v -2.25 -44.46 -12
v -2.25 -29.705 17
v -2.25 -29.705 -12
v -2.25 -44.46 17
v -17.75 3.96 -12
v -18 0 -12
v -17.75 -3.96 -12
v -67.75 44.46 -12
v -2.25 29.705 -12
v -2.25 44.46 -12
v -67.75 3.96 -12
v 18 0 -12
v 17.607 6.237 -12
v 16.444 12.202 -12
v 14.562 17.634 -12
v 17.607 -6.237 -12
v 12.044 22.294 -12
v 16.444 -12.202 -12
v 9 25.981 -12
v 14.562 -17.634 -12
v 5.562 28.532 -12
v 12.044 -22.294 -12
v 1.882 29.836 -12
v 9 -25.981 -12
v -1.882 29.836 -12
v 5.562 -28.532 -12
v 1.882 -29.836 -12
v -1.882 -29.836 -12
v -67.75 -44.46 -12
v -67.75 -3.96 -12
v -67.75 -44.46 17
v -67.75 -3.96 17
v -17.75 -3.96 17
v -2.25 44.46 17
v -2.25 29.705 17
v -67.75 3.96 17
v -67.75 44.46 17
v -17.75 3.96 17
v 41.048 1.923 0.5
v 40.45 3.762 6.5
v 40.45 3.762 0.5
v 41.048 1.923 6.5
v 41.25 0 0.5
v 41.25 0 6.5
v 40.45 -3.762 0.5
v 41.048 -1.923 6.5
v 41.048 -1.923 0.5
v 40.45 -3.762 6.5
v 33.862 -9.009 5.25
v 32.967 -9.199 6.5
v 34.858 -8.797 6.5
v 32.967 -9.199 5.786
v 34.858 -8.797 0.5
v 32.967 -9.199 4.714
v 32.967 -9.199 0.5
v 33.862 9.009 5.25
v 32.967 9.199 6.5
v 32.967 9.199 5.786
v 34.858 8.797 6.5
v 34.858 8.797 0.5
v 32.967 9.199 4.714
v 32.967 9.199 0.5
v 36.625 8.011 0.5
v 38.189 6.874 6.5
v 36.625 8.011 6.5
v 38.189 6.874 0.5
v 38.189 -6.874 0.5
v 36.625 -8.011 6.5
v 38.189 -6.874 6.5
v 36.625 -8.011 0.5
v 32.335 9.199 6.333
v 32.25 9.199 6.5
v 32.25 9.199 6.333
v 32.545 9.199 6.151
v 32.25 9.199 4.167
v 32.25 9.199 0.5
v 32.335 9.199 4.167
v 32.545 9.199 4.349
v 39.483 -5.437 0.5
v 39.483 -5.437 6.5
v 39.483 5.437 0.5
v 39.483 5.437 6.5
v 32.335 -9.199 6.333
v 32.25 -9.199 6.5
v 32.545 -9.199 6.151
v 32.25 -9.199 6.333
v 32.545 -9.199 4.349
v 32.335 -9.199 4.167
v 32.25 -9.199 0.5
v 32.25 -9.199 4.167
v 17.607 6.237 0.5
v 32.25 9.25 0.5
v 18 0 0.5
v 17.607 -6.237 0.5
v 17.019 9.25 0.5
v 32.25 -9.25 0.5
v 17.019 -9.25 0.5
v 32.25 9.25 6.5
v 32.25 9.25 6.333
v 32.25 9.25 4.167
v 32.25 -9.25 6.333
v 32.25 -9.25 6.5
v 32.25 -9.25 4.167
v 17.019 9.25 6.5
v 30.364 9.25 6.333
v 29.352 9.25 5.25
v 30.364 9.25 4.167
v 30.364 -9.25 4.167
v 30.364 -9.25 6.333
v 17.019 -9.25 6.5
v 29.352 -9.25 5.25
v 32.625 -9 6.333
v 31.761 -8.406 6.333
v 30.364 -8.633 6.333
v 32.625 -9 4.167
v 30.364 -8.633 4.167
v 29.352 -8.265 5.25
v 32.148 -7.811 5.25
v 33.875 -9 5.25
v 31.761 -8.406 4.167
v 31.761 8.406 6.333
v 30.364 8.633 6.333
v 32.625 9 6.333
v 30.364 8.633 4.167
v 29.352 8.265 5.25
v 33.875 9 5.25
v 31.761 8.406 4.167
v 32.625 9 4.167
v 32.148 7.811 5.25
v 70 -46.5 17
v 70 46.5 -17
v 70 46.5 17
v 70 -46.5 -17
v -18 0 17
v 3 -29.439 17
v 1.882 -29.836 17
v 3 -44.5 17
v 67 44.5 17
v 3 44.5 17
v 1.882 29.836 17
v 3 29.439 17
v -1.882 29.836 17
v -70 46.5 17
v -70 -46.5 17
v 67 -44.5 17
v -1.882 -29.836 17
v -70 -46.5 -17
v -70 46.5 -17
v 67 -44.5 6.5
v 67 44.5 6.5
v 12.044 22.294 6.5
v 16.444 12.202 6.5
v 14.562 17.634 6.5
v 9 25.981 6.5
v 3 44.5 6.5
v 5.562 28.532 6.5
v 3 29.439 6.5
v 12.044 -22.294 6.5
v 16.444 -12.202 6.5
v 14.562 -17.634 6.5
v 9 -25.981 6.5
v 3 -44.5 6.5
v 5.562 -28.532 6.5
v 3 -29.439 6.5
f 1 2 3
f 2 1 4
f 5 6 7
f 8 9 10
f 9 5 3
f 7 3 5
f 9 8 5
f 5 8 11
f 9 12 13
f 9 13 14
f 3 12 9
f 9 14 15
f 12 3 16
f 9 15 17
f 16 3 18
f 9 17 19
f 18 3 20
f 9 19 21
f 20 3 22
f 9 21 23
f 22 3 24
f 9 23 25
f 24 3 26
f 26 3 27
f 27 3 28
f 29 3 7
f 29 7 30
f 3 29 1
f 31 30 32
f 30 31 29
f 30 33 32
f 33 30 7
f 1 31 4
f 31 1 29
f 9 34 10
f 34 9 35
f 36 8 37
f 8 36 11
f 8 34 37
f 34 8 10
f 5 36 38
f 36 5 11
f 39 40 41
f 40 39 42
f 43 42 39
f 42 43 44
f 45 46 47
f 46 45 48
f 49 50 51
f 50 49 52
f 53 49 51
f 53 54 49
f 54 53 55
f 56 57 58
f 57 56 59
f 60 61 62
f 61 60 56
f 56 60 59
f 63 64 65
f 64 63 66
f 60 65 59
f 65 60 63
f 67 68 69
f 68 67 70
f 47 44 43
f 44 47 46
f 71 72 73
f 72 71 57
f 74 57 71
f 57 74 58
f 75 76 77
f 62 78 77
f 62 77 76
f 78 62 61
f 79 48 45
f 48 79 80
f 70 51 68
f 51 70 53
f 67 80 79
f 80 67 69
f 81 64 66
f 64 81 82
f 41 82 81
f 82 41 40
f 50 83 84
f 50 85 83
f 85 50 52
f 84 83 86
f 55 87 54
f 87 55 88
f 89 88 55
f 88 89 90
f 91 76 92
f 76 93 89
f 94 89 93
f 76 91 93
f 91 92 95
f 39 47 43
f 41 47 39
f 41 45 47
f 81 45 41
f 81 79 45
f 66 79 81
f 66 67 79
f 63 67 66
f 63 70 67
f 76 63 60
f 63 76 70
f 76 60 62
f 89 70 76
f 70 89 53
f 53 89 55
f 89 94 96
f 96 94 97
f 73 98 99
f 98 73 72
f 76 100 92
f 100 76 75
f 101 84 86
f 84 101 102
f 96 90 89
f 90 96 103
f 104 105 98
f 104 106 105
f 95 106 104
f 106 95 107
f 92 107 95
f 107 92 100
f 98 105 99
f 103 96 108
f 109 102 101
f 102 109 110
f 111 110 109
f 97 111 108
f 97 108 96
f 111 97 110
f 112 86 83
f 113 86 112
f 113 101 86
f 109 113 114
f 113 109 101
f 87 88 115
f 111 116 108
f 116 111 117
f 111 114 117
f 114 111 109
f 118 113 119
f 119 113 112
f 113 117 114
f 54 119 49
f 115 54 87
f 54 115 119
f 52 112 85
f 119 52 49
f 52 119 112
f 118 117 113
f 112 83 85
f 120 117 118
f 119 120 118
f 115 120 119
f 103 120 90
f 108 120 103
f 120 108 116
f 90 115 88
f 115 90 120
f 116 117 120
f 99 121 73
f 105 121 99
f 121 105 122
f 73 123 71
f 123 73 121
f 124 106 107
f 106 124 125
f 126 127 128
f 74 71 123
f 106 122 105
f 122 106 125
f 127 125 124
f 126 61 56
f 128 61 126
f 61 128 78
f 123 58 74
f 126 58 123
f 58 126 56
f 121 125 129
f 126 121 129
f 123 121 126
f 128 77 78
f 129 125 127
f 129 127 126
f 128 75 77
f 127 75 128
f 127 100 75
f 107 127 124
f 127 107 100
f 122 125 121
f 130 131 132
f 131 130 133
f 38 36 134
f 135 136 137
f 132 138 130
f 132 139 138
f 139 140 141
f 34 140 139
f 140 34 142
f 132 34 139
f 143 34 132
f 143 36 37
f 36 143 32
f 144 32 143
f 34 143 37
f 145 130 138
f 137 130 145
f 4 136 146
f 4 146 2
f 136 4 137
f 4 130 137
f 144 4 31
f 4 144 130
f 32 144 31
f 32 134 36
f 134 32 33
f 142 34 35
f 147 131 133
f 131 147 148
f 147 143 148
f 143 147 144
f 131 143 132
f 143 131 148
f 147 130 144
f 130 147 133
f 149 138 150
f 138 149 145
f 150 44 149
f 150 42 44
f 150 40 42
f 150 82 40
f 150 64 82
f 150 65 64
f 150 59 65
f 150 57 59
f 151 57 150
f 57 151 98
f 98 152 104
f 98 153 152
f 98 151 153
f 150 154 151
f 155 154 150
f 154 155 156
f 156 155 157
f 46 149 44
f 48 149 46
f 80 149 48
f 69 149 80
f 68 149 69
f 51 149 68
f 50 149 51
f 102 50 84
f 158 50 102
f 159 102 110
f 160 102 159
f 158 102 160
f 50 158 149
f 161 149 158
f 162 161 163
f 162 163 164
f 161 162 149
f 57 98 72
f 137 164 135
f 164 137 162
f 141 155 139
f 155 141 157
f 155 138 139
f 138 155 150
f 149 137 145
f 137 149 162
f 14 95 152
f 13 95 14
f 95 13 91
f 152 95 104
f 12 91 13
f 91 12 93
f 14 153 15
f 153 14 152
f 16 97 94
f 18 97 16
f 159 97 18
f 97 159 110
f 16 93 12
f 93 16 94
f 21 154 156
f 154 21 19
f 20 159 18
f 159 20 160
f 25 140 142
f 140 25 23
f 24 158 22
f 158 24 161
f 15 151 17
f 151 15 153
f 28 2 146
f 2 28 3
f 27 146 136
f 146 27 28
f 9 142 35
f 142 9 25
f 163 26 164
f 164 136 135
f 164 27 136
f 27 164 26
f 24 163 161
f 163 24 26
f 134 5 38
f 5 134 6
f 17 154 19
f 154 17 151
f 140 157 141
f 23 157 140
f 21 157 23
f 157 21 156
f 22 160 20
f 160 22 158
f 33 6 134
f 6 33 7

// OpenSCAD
/* [Design] */
// Overall shape of the box.
design = "three_slots"; // [three_slots: 2 Hero slots - cards on the side, four_slots: 4 Hero slots - cards on top, four_slots_reversed: 4 Hero slots - heros on top]

// Toggle token slot
has_token_slot = true;
// Part of the cross-section in the unused space.
cross_size = [0.5, 0.66]; // [0:0.01:1]
// Additional space on slots.
clearance = 0.5; // [0:0.01:2]

/* [Dimensions] [4 Hero Slots] */
// With hero slots on top, size of the card access holes.
cards_access_hole_radius = 10; // [0:0.1:20]
// With dungeon slots on top, size of the hero slots access hole.
hero_slots_access_hole_radius = 20; // [0:0.1:40]
// Relative size of the access hole for the token
token_slot_access_hole_ratio = 0.55; // [0:0.01:1]

/* [Dimensions] [2 Hero Slots] */
// Toggle token slot notch
has_token_slot_notch = true;
// Length of the central hole.
access_hole_radius = 30; // [0:0.1:50]
// Width of the central role relative to its length.
access_hole_x_scale = 0.6; // [0:0.01:2]
// Additional depth of the health token's slot.
token_slot_depth = 2; // [0:0.1:5]
// How deep "in" the token the notch should be.
token_slot_notch_pressure = 0.5; // [0:0.01:1]

/* [Hardware] */
// Internal size of the box container.
box_total_dimensions = [140, 93, 38]; // [0:0.1:200]
// Size of a hole for all cards of a hero.
hero_holes_size = [65, 40, 14]; // [0:0.1:200]
// Size of the deck of dungeon cards.
cards_hole_size = [88.5, 63.5, 10]; // [0:0.1:200]
// Diameter of the HP token.
token_diameter = 18; // [0:0.1:30]
// Height of the HP token.
token_height = 4; // [0:0.1:10]
// Space left empty for the rules & HP counter.
top_space = 4; // [0:0.1:50]

/* [Hidden] */
// Used to ensure that preview surfaces match expectations.
render_offset = 0.1;
// The size of the game box's bin.
box_dimensions = [box_total_dimensions[0], box_total_dimensions[1], box_total_dimensions[2] - top_space];
// The size of the base game's box.
hero_holes = [hero_holes_size[0] + clearance, hero_holes_size[1] + clearance, hero_holes_size[2] + clearance];
cards_hole = [cards_hole_size[0] + clearance, cards_hole_size[1] + clearance, cards_hole_size[2]+clearance];

module notch_spheres(notch_radius, spacing) {
    for (i=[0:1]) {
        translate([0, (i*2-1)*spacing/2])
        scale([2., 1., 1.])
        sphere(r = notch_radius);
    }
}

module box_three_slots() {
    difference() {
        // Base body
        cube(box_dimensions, center = true);
        for (j=[0,1]) {
            // Hero cards' slot
            translate([
                -hero_holes[0]/2-(box_dimensions[0]/2-hero_holes[0])*cross_size[0],
                (j*2-1)*(hero_holes[1]/2+(box_dimensions[1]/2-hero_holes[1])*cross_size[1]),
                box_dimensions[2]/2 - hero_holes[2] + render_offset/2
            ])
            cube([
                hero_holes[0],
                hero_holes[1],
                2*hero_holes[2] + render_offset
            ], center = true);
        }

        // Dungeon cards' slot
        translate([
            cards_hole[1]/2 + (box_dimensions[0]/2-cards_hole[1])*cross_size[0],
            0,
            (box_dimensions[2]-cards_hole[2]+render_offset)/2
        ])
        cube([cards_hole[1], cards_hole[0], cards_hole[2]+render_offset], center = true);

        // Access hole
        translate([0, 0, (box_dimensions[2]-hero_holes[2]*2+render_offset)/2])
        scale([access_hole_x_scale, 1., 1.])
        cylinder(r=access_hole_radius, h=hero_holes[2]*2+render_offset, center = true);

        // Token's hole
        if (has_token_slot) {
            translate([
                access_hole_x_scale*access_hole_radius + token_diameter*3/4 + clearance,
                0,
                box_dimensions[2]/2-cards_hole[2]-(token_height+token_slot_depth)/2+render_offset/2,
            ])
            difference() {
                union() {
                    cylinder(
                        h=token_height + token_slot_depth + render_offset,
                        r=(token_diameter+clearance)/2,
                        center=true
                    );
                    translate([-token_diameter*3/4, 0])
                    cube([
                        token_diameter*1.5 + clearance,
                        token_diameter + clearance,
                        token_height + token_slot_depth + render_offset
                    ], center=true);
                }
                if (has_token_slot_notch)
                    translate([
                        -(token_slot_depth+token_slot_notch_pressure)/4,
                        0,
                        (token_height+token_slot_depth)/2 - (token_slot_depth+token_slot_notch_pressure)/2 - render_offset/2
                    ])
                    notch_spheres((token_slot_depth+token_slot_notch_pressure)/2, token_diameter);
            }
        }
    }
}

module box_four_slots(reversed = false) {
    token_radius = token_diameter/2;
    cross_section = [
        (box_dimensions[0]-hero_holes_size[0]*2)*cross_size[0],
        (box_dimensions[1]-hero_holes_size[1]*2)*cross_size[1],
    ];

    difference() {
        cube(box_dimensions, center=true);
        // Hero cards' slots
        translate([0, 0, box_dimensions[2] - (reversed?0:cards_hole_size[2]) - hero_holes_size[2]/2]) {
            for(i=[0:3]) let(
                x_direction = pow(-1, i),
                y_direction = pow(-1, floor(i/2))
            ) {
                translate([
                    x_direction * (hero_holes_size[0]/2 + cross_section[0]/2),
                    y_direction * (hero_holes_size[1]/2 + cross_section[1]/2),
                ])
                cube([
                    hero_holes_size[0],
                    hero_holes_size[1],
                    hero_holes_size[2] + box_dimensions[2],
                ], center=true);
            }
            if (!reversed) {
                cylinder(
                    r=hero_slots_access_hole_radius,
                    h = hero_holes_size[2] + box_dimensions[2],
                    center = true
                );
            }
        }
        // Dungeon cards' slot
        translate([
            0,
            0,
            box_dimensions[2] - cards_hole_size[2]/2 - (reversed?hero_holes_size[2]:0),
        ]) {
            cube([
                cards_hole_size[0],
                cards_hole_size[1],
                cards_hole_size[2] + box_dimensions[2],
            ], center = true);
            if (reversed) {
                for (i=[0:3]) {
                    translate([
                        (i%2*2-1) * (cards_hole_size[0] - cards_access_hole_radius) / 2,
                        (floor(i/2)*2-1) * (cards_hole_size[1] -cards_access_hole_radius)/2,
                    ])
                    cylinder(
                        r=cards_access_hole_radius,
                        h=cards_hole_size[2] + box_dimensions[2],
                        center=true
                    );
                }
            }
        }

        // Token slot and access
        if (has_token_slot) {
            translate([
                (box_dimensions[0] + cards_hole_size[0])/4,
                0,
                box_dimensions[2]/2 - token_radius,
            ])
            rotate([90,0,0]) {
                // Token slot
                cylinder(
                    r=token_radius + clearance/2,
                    h=token_height + clearance,
                    center=true
                );

                translate([0, token_radius/2, 0])
                cube([
                    2*token_radius + clearance,
                    token_radius + clearance/2,
                    token_height + clearance,
                ], center=true);
                // Token access
                cylinder(
                    r=token_radius*token_slot_access_hole_ratio,
                    h=cross_section[1]+render_offset,
                    center=true
                );
                translate([0, (token_radius+clearance)/2, 0])
                cube([
                    2*token_radius*token_slot_access_hole_ratio,
                    token_radius + clearance,
                    cross_section[1] + render_offset,
                ], center=true);
            }
        }
    }
}

if (design == "three_slots") {
    box_three_slots();
} else if (design == "four_slots") {
    box_four_slots();
} else if (design == "four_slots_reversed") {
    box_four_slots(reversed = true);
}
